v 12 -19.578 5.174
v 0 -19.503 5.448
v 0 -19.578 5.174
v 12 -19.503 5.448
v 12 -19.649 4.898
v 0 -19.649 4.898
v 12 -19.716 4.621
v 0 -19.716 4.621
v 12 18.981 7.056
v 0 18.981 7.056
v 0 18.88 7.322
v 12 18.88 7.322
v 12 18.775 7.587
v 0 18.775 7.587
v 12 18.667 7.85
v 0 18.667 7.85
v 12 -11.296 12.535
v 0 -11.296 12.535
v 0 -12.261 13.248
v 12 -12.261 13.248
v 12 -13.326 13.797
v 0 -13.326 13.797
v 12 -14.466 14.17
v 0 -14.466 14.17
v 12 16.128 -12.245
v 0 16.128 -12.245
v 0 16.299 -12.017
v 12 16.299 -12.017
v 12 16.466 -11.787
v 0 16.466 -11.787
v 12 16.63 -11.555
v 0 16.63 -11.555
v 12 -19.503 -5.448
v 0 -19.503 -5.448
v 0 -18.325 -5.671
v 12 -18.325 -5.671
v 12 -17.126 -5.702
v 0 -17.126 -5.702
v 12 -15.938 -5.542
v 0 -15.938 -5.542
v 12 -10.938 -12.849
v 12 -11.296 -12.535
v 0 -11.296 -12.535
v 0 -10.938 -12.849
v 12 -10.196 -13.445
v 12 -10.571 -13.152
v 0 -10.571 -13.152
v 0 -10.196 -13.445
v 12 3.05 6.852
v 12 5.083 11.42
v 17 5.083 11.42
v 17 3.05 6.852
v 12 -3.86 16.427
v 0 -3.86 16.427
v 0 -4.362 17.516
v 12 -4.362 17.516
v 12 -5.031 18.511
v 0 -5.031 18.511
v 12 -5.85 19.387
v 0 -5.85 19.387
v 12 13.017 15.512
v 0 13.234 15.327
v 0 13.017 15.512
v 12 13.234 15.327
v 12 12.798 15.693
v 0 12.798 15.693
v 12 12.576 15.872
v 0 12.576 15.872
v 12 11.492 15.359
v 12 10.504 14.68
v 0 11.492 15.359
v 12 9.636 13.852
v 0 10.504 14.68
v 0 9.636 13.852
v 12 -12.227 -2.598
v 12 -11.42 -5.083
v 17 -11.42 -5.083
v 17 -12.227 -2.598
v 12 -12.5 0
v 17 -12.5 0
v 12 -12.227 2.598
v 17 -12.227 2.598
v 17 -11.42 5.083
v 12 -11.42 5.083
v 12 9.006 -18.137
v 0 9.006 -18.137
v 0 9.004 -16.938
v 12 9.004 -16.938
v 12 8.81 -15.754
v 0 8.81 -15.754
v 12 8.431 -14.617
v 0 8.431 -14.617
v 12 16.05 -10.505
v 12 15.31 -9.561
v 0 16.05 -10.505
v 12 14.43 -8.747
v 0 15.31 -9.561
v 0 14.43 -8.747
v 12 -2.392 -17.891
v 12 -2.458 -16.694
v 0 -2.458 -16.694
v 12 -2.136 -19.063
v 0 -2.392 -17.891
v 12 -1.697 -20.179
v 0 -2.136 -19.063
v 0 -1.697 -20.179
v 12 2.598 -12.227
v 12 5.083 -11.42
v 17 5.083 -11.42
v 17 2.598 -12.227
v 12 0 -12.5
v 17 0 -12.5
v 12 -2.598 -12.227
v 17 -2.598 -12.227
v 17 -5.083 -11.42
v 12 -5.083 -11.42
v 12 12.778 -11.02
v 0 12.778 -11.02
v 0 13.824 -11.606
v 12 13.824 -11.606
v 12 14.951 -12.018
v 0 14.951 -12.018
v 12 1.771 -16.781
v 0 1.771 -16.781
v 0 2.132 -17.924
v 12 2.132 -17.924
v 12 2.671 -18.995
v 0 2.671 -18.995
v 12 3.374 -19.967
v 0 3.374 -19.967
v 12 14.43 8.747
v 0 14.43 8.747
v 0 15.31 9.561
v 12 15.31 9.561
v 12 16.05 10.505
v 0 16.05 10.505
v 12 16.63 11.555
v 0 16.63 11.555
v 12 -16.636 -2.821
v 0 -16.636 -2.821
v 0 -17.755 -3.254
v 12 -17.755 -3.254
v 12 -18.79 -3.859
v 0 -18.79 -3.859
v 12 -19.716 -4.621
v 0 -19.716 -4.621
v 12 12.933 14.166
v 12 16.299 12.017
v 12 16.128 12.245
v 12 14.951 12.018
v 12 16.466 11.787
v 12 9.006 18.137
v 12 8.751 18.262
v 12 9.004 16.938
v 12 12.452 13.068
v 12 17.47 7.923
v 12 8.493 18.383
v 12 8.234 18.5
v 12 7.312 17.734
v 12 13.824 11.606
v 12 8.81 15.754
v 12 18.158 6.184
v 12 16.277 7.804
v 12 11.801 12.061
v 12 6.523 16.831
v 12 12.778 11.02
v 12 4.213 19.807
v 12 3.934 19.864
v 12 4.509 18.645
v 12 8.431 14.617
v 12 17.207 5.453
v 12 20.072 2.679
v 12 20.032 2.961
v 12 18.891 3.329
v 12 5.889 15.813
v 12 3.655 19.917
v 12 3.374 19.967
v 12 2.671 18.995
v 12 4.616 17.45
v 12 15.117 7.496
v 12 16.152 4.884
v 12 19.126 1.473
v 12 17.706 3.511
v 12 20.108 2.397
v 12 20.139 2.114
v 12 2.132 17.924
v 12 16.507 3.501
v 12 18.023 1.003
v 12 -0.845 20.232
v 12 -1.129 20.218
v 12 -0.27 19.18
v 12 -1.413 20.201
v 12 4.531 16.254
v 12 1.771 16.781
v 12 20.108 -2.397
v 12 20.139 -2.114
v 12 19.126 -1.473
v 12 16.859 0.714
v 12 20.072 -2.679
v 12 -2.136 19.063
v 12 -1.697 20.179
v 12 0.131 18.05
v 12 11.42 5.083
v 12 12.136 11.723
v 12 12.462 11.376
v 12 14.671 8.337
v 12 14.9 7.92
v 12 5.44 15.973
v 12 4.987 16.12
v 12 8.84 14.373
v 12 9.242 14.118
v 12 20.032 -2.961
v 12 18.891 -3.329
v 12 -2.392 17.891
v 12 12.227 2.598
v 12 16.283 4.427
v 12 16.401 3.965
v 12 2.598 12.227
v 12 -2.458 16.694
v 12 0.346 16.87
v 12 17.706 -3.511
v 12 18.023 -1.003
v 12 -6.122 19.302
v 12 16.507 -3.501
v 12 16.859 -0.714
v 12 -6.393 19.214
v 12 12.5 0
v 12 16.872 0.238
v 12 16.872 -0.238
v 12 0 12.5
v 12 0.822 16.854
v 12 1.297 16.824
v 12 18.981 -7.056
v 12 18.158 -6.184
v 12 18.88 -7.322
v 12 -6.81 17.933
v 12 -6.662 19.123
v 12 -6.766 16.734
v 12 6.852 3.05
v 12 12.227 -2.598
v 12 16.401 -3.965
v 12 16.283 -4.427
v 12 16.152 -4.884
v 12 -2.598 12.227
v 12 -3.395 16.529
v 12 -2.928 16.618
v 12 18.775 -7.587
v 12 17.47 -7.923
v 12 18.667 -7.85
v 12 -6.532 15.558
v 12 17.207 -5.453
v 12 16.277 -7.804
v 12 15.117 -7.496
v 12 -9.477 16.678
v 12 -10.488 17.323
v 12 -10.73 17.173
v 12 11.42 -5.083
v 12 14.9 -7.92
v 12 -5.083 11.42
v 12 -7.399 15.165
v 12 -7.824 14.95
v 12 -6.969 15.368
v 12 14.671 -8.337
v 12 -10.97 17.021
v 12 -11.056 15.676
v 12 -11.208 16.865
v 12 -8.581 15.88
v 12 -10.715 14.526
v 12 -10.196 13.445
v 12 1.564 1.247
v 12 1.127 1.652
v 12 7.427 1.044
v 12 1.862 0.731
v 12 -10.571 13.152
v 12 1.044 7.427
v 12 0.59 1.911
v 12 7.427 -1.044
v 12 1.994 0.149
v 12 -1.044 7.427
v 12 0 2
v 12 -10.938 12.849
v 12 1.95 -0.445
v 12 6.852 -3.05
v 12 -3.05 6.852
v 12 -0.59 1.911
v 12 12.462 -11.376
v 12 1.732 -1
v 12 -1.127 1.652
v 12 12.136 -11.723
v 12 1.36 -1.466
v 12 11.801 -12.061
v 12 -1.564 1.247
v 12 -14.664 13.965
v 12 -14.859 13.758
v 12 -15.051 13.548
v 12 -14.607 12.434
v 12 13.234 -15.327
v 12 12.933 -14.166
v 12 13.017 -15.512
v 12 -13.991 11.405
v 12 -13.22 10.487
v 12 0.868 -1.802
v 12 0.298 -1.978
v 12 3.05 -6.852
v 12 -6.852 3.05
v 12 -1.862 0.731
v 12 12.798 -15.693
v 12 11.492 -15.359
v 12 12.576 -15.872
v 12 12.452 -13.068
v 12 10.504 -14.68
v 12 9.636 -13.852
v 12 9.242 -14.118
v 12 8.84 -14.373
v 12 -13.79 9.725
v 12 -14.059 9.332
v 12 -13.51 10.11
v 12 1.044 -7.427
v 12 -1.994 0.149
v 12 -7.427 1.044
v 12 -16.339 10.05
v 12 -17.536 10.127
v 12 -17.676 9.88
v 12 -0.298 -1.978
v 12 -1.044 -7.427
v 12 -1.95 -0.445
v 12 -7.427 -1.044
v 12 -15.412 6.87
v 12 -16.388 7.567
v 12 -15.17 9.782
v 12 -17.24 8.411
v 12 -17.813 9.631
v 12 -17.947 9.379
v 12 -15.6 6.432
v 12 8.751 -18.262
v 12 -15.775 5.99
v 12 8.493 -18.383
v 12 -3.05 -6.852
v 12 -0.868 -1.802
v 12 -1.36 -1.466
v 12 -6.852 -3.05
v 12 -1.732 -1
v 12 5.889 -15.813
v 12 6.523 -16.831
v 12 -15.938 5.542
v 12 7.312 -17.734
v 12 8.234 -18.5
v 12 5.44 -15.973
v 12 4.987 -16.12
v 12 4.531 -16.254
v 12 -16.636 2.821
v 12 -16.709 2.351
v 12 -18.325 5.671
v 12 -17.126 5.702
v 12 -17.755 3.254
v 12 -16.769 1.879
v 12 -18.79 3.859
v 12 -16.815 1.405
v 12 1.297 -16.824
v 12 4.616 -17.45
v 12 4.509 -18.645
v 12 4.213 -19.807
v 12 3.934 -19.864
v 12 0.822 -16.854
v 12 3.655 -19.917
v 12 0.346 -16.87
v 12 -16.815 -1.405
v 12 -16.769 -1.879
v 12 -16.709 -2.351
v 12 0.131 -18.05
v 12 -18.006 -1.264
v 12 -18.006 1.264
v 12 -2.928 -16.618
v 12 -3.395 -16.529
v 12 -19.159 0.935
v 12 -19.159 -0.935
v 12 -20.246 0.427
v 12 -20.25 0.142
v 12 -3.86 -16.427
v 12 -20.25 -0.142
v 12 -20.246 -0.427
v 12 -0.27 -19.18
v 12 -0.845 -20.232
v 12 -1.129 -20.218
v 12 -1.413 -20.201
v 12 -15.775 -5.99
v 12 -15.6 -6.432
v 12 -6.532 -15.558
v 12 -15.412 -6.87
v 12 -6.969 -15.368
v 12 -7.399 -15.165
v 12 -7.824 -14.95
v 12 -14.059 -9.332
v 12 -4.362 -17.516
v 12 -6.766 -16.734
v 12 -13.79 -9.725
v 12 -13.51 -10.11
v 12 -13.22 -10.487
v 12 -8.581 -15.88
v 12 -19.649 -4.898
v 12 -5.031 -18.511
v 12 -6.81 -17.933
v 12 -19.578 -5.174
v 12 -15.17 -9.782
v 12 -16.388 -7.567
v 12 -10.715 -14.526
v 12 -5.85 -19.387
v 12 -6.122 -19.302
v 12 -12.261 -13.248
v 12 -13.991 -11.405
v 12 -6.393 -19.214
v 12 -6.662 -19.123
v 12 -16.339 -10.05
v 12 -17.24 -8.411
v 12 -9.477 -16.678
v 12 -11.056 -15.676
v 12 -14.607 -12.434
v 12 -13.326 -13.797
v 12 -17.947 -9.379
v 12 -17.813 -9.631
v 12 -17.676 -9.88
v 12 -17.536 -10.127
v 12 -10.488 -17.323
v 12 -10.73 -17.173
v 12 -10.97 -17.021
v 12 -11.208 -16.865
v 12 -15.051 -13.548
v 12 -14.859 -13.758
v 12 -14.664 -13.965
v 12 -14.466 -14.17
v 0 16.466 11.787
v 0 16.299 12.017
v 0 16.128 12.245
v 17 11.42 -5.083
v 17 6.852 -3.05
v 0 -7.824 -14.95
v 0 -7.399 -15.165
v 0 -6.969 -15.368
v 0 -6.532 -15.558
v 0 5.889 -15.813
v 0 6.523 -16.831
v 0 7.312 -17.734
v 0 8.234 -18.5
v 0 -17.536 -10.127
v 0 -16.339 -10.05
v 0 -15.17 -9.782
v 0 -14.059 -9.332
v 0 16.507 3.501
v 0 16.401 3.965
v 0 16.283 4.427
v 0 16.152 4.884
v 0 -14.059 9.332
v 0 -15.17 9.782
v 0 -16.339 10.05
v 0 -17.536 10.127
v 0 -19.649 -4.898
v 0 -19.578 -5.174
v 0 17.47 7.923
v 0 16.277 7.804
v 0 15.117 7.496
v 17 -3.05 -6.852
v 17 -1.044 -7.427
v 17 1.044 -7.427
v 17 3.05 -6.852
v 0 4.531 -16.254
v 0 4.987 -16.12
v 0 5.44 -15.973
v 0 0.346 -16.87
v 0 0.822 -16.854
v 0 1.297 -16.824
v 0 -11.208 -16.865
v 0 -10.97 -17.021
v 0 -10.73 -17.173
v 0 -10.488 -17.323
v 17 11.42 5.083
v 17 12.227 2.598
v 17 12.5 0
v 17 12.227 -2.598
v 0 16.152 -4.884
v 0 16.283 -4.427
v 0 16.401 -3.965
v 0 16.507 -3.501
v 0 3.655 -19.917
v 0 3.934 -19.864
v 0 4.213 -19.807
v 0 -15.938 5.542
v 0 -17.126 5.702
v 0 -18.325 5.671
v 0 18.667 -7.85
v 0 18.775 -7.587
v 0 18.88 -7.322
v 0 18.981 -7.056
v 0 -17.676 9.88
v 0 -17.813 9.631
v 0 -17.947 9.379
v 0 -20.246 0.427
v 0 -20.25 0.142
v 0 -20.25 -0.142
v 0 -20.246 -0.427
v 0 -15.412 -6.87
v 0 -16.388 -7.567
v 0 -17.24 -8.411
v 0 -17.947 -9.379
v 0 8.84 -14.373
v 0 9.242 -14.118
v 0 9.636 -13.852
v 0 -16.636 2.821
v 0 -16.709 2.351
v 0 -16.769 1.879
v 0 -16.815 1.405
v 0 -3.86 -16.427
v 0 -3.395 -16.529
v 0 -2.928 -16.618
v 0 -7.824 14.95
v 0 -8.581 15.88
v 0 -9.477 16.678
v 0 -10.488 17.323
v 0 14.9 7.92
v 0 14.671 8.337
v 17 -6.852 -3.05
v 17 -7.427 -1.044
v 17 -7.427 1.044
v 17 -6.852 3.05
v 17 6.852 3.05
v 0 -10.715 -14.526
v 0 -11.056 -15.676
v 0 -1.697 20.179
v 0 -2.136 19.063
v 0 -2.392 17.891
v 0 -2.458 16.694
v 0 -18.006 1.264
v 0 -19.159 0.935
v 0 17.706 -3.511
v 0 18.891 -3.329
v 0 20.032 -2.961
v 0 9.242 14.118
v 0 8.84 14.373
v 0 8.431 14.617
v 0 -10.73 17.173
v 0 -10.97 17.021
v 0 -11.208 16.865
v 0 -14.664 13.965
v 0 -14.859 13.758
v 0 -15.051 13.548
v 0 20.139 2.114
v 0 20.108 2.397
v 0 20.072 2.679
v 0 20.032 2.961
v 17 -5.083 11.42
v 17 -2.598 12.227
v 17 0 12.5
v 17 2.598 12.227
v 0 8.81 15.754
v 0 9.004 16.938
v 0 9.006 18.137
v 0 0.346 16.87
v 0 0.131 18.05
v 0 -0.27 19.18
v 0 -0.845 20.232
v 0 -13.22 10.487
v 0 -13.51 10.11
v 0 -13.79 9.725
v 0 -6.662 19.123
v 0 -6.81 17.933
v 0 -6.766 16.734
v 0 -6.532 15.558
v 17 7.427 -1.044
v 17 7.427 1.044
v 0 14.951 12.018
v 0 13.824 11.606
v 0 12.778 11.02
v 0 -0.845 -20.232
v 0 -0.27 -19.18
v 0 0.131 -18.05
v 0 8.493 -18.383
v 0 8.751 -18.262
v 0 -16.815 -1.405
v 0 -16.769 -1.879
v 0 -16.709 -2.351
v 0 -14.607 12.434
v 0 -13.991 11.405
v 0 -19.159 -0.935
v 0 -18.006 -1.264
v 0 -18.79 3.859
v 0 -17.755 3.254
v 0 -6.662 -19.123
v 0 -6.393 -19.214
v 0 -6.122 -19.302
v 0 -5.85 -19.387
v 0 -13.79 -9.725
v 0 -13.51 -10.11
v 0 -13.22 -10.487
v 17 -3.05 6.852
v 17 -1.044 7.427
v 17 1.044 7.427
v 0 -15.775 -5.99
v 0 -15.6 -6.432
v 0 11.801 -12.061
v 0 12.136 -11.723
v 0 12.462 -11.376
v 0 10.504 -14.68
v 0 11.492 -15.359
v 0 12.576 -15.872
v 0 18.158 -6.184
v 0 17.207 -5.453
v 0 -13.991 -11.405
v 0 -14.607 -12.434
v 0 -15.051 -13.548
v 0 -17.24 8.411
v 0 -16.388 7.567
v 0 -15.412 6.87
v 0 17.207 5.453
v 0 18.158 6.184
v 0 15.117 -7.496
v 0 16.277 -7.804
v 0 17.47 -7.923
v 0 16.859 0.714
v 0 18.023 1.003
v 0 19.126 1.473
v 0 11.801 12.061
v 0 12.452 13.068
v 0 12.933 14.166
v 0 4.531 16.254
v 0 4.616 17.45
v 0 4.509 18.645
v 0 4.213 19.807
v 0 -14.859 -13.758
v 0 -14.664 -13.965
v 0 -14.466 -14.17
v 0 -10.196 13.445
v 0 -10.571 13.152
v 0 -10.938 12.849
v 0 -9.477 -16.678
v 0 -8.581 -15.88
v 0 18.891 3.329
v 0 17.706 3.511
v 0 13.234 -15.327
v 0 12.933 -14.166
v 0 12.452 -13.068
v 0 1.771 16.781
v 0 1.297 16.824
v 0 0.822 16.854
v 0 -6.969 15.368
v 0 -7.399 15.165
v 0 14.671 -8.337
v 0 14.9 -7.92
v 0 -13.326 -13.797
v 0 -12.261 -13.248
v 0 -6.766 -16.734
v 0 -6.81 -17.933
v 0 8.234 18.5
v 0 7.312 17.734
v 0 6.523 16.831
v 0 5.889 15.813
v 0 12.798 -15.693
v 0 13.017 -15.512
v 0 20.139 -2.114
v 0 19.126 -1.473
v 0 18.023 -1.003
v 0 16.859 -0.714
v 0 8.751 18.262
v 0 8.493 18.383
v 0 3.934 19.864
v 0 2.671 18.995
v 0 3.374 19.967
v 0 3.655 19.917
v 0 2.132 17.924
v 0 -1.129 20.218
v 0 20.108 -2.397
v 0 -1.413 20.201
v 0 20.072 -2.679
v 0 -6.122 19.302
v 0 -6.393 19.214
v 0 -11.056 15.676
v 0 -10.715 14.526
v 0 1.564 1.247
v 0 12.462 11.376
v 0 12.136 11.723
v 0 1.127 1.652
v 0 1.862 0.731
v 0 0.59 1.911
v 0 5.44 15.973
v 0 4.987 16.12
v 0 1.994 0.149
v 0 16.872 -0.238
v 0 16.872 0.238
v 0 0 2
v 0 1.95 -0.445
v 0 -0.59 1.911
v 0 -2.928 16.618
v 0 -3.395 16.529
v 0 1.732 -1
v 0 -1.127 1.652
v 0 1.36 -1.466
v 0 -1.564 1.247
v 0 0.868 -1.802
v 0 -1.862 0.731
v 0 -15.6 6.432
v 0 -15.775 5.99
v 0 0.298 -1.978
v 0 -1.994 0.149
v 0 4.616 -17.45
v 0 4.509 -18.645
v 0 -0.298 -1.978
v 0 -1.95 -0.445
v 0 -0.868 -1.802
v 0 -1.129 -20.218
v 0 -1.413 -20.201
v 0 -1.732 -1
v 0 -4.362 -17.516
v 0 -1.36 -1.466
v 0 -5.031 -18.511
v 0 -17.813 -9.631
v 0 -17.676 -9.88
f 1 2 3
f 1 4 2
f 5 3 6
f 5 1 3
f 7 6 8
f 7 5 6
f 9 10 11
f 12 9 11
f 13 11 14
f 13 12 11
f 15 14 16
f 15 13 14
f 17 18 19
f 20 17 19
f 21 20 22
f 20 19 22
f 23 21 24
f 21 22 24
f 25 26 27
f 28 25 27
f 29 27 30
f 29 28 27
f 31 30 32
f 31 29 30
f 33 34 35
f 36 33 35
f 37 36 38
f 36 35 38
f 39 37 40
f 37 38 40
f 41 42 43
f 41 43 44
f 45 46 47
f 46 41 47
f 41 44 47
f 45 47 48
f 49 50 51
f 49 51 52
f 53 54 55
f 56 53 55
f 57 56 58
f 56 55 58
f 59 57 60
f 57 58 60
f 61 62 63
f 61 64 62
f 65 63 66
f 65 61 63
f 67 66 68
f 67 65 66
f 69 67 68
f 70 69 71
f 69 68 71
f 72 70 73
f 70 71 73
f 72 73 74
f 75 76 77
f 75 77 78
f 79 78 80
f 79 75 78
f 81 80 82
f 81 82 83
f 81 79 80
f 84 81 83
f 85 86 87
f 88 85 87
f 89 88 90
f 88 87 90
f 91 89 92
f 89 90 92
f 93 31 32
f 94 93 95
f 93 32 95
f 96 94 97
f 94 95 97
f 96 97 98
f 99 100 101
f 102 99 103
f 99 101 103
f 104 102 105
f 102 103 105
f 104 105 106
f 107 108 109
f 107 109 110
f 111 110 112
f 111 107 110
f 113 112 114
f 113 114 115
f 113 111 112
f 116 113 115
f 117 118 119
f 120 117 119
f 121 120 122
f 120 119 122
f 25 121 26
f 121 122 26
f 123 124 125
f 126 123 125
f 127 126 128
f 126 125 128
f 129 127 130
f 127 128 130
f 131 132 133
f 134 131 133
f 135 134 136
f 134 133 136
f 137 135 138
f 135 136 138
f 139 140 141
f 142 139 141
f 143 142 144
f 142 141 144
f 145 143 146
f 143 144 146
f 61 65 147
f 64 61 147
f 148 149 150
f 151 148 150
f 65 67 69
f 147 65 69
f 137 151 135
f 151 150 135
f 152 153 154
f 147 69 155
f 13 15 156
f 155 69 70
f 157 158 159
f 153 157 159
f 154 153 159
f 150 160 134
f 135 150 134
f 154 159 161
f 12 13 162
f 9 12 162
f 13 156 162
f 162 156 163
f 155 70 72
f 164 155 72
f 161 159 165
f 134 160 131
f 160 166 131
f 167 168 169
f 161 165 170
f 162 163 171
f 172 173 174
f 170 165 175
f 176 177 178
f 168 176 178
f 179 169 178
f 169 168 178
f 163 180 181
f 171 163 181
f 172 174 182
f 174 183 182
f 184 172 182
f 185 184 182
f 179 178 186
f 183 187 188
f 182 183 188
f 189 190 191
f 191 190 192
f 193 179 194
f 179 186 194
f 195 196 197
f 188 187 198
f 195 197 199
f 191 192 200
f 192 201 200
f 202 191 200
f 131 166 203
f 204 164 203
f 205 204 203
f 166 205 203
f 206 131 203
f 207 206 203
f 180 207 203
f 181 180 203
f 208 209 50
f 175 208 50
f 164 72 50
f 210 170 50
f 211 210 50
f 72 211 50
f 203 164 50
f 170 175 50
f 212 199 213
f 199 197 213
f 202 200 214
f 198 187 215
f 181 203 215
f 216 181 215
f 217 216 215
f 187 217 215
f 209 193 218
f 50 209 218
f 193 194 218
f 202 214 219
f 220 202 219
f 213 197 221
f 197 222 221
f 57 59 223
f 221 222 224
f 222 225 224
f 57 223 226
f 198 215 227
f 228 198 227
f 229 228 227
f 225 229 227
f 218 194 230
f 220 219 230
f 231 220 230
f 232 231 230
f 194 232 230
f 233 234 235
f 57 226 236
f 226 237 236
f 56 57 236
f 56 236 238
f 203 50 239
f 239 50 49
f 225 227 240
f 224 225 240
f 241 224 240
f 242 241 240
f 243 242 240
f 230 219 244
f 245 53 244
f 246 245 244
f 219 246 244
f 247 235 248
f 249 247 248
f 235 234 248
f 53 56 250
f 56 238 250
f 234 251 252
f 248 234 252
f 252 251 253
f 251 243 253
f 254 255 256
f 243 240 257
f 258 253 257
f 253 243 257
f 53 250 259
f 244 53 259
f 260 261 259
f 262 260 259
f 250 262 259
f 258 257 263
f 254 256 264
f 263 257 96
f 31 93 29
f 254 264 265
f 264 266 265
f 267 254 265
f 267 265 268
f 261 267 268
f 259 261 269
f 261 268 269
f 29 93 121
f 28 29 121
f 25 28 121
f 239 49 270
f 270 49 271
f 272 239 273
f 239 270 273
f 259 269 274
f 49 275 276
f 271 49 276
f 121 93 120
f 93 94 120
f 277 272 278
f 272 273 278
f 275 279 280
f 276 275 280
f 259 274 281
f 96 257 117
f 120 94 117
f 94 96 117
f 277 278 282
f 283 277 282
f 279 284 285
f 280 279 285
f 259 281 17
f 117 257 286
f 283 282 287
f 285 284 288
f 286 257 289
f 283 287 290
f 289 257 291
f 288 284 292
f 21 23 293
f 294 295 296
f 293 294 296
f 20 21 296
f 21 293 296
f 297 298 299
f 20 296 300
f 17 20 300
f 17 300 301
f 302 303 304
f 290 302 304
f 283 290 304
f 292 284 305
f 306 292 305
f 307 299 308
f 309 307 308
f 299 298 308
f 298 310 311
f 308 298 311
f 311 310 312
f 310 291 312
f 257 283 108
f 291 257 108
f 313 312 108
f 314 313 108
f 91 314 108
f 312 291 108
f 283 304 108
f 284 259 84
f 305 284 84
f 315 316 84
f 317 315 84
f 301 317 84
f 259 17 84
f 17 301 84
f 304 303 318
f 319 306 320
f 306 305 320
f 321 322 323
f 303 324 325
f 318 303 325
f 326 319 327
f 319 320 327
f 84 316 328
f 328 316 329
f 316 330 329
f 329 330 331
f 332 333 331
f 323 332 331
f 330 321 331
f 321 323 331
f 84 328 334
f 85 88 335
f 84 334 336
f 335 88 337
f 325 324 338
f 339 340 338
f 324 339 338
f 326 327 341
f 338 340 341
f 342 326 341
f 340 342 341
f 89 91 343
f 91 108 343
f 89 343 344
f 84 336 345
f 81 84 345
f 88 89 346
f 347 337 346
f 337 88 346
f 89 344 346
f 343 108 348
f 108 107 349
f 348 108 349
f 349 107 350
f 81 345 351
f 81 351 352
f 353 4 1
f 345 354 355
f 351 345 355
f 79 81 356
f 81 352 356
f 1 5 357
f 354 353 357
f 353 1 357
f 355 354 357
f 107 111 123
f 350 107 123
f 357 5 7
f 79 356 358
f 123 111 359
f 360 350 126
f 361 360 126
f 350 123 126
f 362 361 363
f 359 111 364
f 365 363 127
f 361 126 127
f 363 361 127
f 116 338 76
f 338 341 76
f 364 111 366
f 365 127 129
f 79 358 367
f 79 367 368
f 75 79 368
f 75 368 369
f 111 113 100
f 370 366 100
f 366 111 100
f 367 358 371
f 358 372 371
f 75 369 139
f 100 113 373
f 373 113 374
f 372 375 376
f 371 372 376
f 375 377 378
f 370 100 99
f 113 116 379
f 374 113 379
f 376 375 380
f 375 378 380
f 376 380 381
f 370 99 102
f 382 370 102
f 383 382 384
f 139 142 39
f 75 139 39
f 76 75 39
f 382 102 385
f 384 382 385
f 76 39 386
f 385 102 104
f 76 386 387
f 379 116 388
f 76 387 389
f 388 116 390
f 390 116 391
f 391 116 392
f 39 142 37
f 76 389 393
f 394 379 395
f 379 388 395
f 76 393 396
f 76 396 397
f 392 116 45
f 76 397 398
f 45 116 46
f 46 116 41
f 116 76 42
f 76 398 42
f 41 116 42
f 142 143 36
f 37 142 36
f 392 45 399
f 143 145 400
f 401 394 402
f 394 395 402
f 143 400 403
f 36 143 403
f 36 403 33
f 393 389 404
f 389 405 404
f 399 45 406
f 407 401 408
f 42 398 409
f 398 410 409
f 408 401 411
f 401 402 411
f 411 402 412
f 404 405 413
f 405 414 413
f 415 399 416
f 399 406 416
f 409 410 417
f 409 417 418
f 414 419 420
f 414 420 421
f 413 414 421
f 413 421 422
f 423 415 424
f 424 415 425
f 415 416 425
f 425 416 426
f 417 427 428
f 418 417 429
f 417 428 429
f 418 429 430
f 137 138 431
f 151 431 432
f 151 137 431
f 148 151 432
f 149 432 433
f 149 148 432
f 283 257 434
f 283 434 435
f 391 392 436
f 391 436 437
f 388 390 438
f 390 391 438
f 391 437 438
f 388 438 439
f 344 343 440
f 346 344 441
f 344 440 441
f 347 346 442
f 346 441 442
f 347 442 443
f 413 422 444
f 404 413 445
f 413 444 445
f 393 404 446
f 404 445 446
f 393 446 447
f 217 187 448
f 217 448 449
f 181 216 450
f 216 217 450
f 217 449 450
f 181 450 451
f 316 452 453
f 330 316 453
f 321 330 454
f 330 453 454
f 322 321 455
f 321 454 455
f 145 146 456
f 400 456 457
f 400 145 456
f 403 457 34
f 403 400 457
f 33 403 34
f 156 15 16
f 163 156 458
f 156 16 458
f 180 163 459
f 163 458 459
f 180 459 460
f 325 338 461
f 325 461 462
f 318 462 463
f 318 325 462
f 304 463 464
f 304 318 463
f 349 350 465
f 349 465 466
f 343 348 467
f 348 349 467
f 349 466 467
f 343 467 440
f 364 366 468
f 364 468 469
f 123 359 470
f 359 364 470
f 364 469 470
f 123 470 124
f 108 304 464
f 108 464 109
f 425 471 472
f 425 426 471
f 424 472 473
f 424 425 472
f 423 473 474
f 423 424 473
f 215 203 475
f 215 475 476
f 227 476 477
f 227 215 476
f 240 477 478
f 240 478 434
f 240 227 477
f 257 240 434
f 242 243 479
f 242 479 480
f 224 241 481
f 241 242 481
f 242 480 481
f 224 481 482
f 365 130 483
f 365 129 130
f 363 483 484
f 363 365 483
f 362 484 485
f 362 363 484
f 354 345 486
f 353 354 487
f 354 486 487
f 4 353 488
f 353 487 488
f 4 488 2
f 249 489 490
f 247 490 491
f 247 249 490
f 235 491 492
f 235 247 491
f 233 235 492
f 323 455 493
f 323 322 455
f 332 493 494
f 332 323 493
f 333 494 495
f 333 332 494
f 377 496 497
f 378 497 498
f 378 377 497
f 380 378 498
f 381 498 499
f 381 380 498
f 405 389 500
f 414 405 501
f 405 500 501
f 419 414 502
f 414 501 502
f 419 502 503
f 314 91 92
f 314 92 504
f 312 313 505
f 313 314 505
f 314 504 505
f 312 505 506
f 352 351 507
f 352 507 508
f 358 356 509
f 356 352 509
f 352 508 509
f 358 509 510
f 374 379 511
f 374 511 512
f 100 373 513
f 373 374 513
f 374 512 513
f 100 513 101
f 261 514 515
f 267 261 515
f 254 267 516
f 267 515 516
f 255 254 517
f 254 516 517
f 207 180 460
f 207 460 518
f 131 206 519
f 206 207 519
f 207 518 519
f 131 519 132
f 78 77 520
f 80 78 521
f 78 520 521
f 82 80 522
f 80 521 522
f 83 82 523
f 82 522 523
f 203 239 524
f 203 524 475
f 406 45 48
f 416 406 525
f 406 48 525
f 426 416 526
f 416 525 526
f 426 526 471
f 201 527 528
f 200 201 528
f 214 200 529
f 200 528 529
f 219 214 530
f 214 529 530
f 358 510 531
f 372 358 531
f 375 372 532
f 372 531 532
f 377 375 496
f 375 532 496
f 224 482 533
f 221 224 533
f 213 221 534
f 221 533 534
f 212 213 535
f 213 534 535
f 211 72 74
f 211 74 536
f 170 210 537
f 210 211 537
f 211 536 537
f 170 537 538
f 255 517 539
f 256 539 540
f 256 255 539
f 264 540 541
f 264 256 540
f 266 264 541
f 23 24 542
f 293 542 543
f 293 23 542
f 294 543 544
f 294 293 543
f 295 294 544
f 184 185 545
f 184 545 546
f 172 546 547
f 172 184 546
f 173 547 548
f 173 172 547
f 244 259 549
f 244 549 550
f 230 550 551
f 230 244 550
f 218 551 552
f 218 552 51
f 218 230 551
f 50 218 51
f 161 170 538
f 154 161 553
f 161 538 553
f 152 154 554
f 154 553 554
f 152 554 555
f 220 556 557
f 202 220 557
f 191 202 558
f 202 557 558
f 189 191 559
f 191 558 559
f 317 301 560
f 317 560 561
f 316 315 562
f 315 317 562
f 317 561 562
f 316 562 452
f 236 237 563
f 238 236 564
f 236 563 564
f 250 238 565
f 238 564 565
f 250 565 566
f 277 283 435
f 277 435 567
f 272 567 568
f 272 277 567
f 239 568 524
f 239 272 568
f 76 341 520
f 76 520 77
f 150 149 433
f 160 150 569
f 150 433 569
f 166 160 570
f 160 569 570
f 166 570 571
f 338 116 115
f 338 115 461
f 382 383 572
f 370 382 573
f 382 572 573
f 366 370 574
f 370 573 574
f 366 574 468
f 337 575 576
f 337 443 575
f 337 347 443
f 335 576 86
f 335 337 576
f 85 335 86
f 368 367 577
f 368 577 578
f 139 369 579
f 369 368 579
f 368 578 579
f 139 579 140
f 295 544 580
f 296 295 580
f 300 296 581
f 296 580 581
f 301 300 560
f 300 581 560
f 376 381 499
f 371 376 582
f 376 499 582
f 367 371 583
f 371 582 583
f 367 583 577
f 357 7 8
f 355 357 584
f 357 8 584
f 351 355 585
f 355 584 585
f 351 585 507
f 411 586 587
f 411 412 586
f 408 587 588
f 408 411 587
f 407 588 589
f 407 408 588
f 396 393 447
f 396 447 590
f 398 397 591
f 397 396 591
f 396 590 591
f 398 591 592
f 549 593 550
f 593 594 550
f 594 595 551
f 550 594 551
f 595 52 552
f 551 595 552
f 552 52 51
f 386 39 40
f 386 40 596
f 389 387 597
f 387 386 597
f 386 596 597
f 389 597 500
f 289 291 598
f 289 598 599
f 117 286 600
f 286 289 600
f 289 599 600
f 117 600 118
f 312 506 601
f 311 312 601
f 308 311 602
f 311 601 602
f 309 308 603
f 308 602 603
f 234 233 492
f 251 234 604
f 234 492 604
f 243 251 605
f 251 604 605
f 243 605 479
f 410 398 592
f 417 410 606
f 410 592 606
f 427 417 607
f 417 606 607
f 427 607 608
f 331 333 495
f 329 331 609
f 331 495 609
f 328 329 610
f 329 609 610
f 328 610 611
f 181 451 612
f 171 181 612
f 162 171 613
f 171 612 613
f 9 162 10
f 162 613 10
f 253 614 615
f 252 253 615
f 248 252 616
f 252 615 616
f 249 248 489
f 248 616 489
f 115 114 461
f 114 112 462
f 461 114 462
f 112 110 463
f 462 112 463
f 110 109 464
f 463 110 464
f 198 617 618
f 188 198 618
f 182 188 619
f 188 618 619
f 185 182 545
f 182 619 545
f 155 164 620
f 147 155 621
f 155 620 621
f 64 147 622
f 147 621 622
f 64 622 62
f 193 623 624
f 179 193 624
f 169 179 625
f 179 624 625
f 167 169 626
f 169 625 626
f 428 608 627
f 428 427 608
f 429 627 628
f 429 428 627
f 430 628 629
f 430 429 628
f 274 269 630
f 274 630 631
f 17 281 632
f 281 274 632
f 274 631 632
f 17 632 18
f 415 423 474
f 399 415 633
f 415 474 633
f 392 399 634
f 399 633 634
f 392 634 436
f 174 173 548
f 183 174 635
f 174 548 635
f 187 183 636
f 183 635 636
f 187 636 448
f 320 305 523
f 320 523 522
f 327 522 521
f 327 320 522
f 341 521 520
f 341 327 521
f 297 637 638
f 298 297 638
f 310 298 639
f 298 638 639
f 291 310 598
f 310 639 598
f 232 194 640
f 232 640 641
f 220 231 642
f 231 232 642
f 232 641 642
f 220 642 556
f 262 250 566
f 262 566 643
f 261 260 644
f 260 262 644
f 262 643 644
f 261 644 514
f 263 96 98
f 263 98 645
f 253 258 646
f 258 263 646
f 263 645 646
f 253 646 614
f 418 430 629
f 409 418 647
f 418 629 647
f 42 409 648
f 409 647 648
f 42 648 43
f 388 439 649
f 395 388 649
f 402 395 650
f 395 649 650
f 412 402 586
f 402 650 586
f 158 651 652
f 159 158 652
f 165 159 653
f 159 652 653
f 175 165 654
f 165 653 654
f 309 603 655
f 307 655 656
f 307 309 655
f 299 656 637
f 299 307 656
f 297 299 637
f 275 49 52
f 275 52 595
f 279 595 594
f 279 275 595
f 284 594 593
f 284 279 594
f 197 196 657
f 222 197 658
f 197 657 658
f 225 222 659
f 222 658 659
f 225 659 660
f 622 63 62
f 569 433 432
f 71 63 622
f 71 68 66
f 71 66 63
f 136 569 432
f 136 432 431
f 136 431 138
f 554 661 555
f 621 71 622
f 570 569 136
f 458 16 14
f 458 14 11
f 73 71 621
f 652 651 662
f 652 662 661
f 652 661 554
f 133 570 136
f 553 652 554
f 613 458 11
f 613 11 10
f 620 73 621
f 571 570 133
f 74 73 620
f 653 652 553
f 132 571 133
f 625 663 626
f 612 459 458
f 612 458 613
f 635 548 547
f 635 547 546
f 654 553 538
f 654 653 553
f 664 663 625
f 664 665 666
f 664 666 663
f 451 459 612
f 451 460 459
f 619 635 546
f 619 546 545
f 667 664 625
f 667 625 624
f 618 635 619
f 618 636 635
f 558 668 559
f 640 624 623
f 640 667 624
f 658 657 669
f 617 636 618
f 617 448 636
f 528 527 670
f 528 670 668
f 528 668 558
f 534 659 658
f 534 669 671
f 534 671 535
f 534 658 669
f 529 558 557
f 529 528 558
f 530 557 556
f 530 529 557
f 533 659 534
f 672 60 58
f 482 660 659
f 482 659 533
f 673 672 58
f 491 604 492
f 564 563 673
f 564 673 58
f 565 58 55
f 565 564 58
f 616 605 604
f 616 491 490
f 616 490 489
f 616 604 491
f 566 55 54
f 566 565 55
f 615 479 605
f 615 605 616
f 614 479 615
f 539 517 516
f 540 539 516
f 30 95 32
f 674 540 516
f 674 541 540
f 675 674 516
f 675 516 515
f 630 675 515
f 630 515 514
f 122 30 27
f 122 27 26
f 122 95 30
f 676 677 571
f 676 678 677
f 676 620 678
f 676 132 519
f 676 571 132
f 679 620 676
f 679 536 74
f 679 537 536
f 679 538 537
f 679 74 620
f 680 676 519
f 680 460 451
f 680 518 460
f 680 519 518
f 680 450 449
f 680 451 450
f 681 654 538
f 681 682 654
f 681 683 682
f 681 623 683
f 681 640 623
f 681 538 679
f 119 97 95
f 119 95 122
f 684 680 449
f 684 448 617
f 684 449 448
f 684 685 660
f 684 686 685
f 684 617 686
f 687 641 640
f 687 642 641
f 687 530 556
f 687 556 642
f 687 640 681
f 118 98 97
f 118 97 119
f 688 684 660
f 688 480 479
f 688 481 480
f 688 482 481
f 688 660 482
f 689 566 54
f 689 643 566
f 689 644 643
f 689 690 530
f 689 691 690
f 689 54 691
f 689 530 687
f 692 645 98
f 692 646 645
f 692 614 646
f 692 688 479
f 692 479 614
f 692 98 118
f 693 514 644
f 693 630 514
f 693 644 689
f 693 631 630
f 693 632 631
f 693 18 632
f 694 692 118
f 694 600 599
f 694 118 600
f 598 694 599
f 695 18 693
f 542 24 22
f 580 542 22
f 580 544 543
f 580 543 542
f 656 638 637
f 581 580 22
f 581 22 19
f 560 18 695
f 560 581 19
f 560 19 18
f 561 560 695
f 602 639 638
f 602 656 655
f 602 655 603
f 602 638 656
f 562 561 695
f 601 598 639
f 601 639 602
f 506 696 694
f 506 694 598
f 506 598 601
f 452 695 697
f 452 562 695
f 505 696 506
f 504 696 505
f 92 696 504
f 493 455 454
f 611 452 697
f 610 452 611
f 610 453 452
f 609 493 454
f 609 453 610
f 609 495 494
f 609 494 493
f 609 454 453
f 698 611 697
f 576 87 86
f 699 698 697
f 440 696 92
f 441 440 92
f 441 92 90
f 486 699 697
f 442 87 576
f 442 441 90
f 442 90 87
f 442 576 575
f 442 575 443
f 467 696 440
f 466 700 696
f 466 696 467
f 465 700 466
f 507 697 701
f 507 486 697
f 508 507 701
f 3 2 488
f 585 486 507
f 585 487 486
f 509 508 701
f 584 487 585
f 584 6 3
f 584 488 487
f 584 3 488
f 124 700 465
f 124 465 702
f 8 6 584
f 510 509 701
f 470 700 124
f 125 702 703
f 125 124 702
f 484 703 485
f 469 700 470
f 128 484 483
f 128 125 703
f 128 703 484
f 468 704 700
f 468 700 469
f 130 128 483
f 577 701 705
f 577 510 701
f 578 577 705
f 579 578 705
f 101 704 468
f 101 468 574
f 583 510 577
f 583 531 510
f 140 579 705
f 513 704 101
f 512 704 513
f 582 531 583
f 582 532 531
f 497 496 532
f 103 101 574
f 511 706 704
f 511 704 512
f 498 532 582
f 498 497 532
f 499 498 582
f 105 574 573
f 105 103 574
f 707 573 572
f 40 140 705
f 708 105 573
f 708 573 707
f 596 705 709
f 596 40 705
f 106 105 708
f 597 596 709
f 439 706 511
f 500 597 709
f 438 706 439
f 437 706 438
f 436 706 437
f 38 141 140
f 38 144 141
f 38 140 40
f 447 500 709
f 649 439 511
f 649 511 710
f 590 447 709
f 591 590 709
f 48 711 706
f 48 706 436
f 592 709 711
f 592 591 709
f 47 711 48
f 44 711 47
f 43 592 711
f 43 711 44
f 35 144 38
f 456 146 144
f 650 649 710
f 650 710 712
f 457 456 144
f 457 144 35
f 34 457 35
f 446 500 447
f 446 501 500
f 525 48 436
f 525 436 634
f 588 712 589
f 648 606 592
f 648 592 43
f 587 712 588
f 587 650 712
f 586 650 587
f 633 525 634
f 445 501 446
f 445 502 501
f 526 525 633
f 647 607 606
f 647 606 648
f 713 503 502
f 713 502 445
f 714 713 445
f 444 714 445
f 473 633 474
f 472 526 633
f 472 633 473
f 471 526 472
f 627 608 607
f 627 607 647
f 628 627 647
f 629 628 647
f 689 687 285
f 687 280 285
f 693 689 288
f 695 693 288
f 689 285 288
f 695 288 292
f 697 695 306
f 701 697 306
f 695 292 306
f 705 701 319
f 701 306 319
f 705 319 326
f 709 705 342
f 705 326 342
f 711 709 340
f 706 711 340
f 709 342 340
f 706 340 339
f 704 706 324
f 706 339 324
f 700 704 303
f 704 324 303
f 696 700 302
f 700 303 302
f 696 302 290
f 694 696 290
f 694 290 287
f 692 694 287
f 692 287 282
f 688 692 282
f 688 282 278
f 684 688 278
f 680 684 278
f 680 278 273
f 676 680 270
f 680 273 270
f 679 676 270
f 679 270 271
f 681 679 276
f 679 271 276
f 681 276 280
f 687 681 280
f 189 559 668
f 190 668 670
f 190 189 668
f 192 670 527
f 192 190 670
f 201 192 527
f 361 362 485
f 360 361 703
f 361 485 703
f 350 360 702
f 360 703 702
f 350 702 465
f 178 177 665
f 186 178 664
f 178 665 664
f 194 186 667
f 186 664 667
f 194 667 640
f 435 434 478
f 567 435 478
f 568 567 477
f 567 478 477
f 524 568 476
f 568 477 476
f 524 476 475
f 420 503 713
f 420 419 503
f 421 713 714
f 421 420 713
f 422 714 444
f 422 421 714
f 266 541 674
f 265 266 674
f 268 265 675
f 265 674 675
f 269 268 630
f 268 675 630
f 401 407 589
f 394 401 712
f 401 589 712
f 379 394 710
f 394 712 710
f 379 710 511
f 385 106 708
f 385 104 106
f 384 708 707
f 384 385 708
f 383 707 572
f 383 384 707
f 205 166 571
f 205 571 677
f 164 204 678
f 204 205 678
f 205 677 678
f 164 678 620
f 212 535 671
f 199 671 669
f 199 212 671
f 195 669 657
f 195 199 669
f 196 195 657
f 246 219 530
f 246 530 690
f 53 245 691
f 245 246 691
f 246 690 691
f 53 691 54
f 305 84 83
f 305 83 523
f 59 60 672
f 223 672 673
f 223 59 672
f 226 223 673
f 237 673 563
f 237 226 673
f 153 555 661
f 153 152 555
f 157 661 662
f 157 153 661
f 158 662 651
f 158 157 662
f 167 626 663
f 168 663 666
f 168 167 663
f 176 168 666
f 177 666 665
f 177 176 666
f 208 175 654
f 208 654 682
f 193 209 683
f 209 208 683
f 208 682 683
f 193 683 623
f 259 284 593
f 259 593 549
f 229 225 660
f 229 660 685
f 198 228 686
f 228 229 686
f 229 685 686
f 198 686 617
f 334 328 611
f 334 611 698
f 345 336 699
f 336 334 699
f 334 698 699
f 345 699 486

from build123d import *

# Parameters (mm, degrees)
BASPROSKE_W     = 12
BASPROSKE_H     = 20.25
TOOTHCUT_DEPTH  = 32.050362317
TEETHCUTS_COUNT = 25
TEETHCUTS_ANGLE = 345.6
BORSKE_R        = 2
BORE_DEPTH      = 50.0000508
EXTRUDE_1_DEPTH = 5


with BuildPart() as part:
    # BasProSke → Base-Revolve (revolve)
    with BuildSketch(Plane(origin=(0, 0, 0), x_dir=(1, 0, 0), z_dir=(0, 1, 0)), mode=Mode.PRIVATE) as base_revolve_sk:
        with Locations((6, 10.125)):
            Rectangle(BASPROSKE_W, BASPROSKE_H)
    revolve(base_revolve_sk.sketch.rotate(Axis((-10, 0, 0), (1, 0, 0)), 180), axis=Axis((-10, 0, 0), (1, 0, 0)))

    # TooCutSke → ToothCut (cut, through all)
    with BuildSketch(Plane(origin=(0, 0, 0), x_dir=(0, 0, -1), z_dir=(1, 0, 0))):
        with BuildLine():
            ThreePointArc((0.713909619, 16.858891098), (0, 16.874), (-0.713909619, 16.858891098))
            ThreePointArc((-0.713909619, 16.858891098), (-1.221902209, 18.597177626), (-2.131751691, 20.163022588))
            ThreePointArc((-2.131751691, 20.163022588), (0, 20.2754), (2.131751691, 20.163022588))
            ThreePointArc((2.131751691, 20.163022588), (1.221902209, 18.597177626), (0.713909619, 16.858891098))
        make_face()
    toothcut = extrude(amount=TOOTHCUT_DEPTH, mode=Mode.SUBTRACT)

    # TeethCuts: ToothCut ×25 about axis
    teethcuts_axis = Axis((-10, 0, 0), (1, 0, 0))
    for i in range(1, TEETHCUTS_COUNT):
        add(toothcut.rotate(teethcuts_axis, i * TEETHCUTS_ANGLE / (TEETHCUTS_COUNT - 1)), mode=Mode.SUBTRACT)

    # BorSke → Bore (cut, symmetric)
    with BuildSketch(Plane(origin=(0, 0, 0), x_dir=(0, 0, -1), z_dir=(1, 0, 0))):
        with Locations(Location((0, 0, 0), (0, 0, 180))):
            Circle(BORSKE_R)
    extrude(amount=BORE_DEPTH, both=True, mode=Mode.SUBTRACT)

    # 草图2 → 凸台-拉伸1 (add)
    with BuildSketch(Plane(origin=(12, 0, 0), x_dir=(0, 0, -1), z_dir=(1, 0, 0))):
        with BuildLine():
            Line((-3.049889257, 6.851873869), (-5.083148762, 11.419789782))
            ThreePointArc((-5.083148762, 11.419789782), (0, 12.5), (5.083148762, 11.419789782))
            Line((5.083148762, 11.419789782), (3.049889257, 6.851873869))
            ThreePointArc((3.049889257, 6.851873869), (0, 7.5), (-3.049889257, 6.851873869))
        make_face()
        with BuildLine():
            Line((6.851873869, 3.049889257), (11.419789782, 5.083148762))
            ThreePointArc((11.419789782, 5.083148762), (12.5, 0), (11.419789782, -5.083148762))
            Line((11.419789782, -5.083148762), (6.851873869, -3.049889257))
            ThreePointArc((6.851873869, -3.049889257), (7.5, 0), (6.851873869, 3.049889257))
        make_face()
        with BuildLine():
            Line((3.049889257, -6.851873869), (5.083148762, -11.419789782))
            ThreePointArc((5.083148762, -11.419789782), (0, -12.5), (-5.083148762, -11.419789782))
            Line((-5.083148762, -11.419789782), (-3.049889257, -6.851873869))
            ThreePointArc((-3.049889257, -6.851873869), (0, -7.5), (3.049889257, -6.851873869))
        make_face()
        with BuildLine():
            Line((-6.851873869, -3.049889257), (-11.419789782, -5.083148762))
            ThreePointArc((-11.419789782, -5.083148762), (-12.5, 0), (-11.419789782, 5.083148762))
            Line((-11.419789782, 5.083148762), (-6.851873869, 3.049889257))
            ThreePointArc((-6.851873869, 3.049889257), (-7.5, 0), (-6.851873869, -3.049889257))
        make_face()
    extrude(amount=EXTRUDE_1_DEPTH)


solid = part.part
